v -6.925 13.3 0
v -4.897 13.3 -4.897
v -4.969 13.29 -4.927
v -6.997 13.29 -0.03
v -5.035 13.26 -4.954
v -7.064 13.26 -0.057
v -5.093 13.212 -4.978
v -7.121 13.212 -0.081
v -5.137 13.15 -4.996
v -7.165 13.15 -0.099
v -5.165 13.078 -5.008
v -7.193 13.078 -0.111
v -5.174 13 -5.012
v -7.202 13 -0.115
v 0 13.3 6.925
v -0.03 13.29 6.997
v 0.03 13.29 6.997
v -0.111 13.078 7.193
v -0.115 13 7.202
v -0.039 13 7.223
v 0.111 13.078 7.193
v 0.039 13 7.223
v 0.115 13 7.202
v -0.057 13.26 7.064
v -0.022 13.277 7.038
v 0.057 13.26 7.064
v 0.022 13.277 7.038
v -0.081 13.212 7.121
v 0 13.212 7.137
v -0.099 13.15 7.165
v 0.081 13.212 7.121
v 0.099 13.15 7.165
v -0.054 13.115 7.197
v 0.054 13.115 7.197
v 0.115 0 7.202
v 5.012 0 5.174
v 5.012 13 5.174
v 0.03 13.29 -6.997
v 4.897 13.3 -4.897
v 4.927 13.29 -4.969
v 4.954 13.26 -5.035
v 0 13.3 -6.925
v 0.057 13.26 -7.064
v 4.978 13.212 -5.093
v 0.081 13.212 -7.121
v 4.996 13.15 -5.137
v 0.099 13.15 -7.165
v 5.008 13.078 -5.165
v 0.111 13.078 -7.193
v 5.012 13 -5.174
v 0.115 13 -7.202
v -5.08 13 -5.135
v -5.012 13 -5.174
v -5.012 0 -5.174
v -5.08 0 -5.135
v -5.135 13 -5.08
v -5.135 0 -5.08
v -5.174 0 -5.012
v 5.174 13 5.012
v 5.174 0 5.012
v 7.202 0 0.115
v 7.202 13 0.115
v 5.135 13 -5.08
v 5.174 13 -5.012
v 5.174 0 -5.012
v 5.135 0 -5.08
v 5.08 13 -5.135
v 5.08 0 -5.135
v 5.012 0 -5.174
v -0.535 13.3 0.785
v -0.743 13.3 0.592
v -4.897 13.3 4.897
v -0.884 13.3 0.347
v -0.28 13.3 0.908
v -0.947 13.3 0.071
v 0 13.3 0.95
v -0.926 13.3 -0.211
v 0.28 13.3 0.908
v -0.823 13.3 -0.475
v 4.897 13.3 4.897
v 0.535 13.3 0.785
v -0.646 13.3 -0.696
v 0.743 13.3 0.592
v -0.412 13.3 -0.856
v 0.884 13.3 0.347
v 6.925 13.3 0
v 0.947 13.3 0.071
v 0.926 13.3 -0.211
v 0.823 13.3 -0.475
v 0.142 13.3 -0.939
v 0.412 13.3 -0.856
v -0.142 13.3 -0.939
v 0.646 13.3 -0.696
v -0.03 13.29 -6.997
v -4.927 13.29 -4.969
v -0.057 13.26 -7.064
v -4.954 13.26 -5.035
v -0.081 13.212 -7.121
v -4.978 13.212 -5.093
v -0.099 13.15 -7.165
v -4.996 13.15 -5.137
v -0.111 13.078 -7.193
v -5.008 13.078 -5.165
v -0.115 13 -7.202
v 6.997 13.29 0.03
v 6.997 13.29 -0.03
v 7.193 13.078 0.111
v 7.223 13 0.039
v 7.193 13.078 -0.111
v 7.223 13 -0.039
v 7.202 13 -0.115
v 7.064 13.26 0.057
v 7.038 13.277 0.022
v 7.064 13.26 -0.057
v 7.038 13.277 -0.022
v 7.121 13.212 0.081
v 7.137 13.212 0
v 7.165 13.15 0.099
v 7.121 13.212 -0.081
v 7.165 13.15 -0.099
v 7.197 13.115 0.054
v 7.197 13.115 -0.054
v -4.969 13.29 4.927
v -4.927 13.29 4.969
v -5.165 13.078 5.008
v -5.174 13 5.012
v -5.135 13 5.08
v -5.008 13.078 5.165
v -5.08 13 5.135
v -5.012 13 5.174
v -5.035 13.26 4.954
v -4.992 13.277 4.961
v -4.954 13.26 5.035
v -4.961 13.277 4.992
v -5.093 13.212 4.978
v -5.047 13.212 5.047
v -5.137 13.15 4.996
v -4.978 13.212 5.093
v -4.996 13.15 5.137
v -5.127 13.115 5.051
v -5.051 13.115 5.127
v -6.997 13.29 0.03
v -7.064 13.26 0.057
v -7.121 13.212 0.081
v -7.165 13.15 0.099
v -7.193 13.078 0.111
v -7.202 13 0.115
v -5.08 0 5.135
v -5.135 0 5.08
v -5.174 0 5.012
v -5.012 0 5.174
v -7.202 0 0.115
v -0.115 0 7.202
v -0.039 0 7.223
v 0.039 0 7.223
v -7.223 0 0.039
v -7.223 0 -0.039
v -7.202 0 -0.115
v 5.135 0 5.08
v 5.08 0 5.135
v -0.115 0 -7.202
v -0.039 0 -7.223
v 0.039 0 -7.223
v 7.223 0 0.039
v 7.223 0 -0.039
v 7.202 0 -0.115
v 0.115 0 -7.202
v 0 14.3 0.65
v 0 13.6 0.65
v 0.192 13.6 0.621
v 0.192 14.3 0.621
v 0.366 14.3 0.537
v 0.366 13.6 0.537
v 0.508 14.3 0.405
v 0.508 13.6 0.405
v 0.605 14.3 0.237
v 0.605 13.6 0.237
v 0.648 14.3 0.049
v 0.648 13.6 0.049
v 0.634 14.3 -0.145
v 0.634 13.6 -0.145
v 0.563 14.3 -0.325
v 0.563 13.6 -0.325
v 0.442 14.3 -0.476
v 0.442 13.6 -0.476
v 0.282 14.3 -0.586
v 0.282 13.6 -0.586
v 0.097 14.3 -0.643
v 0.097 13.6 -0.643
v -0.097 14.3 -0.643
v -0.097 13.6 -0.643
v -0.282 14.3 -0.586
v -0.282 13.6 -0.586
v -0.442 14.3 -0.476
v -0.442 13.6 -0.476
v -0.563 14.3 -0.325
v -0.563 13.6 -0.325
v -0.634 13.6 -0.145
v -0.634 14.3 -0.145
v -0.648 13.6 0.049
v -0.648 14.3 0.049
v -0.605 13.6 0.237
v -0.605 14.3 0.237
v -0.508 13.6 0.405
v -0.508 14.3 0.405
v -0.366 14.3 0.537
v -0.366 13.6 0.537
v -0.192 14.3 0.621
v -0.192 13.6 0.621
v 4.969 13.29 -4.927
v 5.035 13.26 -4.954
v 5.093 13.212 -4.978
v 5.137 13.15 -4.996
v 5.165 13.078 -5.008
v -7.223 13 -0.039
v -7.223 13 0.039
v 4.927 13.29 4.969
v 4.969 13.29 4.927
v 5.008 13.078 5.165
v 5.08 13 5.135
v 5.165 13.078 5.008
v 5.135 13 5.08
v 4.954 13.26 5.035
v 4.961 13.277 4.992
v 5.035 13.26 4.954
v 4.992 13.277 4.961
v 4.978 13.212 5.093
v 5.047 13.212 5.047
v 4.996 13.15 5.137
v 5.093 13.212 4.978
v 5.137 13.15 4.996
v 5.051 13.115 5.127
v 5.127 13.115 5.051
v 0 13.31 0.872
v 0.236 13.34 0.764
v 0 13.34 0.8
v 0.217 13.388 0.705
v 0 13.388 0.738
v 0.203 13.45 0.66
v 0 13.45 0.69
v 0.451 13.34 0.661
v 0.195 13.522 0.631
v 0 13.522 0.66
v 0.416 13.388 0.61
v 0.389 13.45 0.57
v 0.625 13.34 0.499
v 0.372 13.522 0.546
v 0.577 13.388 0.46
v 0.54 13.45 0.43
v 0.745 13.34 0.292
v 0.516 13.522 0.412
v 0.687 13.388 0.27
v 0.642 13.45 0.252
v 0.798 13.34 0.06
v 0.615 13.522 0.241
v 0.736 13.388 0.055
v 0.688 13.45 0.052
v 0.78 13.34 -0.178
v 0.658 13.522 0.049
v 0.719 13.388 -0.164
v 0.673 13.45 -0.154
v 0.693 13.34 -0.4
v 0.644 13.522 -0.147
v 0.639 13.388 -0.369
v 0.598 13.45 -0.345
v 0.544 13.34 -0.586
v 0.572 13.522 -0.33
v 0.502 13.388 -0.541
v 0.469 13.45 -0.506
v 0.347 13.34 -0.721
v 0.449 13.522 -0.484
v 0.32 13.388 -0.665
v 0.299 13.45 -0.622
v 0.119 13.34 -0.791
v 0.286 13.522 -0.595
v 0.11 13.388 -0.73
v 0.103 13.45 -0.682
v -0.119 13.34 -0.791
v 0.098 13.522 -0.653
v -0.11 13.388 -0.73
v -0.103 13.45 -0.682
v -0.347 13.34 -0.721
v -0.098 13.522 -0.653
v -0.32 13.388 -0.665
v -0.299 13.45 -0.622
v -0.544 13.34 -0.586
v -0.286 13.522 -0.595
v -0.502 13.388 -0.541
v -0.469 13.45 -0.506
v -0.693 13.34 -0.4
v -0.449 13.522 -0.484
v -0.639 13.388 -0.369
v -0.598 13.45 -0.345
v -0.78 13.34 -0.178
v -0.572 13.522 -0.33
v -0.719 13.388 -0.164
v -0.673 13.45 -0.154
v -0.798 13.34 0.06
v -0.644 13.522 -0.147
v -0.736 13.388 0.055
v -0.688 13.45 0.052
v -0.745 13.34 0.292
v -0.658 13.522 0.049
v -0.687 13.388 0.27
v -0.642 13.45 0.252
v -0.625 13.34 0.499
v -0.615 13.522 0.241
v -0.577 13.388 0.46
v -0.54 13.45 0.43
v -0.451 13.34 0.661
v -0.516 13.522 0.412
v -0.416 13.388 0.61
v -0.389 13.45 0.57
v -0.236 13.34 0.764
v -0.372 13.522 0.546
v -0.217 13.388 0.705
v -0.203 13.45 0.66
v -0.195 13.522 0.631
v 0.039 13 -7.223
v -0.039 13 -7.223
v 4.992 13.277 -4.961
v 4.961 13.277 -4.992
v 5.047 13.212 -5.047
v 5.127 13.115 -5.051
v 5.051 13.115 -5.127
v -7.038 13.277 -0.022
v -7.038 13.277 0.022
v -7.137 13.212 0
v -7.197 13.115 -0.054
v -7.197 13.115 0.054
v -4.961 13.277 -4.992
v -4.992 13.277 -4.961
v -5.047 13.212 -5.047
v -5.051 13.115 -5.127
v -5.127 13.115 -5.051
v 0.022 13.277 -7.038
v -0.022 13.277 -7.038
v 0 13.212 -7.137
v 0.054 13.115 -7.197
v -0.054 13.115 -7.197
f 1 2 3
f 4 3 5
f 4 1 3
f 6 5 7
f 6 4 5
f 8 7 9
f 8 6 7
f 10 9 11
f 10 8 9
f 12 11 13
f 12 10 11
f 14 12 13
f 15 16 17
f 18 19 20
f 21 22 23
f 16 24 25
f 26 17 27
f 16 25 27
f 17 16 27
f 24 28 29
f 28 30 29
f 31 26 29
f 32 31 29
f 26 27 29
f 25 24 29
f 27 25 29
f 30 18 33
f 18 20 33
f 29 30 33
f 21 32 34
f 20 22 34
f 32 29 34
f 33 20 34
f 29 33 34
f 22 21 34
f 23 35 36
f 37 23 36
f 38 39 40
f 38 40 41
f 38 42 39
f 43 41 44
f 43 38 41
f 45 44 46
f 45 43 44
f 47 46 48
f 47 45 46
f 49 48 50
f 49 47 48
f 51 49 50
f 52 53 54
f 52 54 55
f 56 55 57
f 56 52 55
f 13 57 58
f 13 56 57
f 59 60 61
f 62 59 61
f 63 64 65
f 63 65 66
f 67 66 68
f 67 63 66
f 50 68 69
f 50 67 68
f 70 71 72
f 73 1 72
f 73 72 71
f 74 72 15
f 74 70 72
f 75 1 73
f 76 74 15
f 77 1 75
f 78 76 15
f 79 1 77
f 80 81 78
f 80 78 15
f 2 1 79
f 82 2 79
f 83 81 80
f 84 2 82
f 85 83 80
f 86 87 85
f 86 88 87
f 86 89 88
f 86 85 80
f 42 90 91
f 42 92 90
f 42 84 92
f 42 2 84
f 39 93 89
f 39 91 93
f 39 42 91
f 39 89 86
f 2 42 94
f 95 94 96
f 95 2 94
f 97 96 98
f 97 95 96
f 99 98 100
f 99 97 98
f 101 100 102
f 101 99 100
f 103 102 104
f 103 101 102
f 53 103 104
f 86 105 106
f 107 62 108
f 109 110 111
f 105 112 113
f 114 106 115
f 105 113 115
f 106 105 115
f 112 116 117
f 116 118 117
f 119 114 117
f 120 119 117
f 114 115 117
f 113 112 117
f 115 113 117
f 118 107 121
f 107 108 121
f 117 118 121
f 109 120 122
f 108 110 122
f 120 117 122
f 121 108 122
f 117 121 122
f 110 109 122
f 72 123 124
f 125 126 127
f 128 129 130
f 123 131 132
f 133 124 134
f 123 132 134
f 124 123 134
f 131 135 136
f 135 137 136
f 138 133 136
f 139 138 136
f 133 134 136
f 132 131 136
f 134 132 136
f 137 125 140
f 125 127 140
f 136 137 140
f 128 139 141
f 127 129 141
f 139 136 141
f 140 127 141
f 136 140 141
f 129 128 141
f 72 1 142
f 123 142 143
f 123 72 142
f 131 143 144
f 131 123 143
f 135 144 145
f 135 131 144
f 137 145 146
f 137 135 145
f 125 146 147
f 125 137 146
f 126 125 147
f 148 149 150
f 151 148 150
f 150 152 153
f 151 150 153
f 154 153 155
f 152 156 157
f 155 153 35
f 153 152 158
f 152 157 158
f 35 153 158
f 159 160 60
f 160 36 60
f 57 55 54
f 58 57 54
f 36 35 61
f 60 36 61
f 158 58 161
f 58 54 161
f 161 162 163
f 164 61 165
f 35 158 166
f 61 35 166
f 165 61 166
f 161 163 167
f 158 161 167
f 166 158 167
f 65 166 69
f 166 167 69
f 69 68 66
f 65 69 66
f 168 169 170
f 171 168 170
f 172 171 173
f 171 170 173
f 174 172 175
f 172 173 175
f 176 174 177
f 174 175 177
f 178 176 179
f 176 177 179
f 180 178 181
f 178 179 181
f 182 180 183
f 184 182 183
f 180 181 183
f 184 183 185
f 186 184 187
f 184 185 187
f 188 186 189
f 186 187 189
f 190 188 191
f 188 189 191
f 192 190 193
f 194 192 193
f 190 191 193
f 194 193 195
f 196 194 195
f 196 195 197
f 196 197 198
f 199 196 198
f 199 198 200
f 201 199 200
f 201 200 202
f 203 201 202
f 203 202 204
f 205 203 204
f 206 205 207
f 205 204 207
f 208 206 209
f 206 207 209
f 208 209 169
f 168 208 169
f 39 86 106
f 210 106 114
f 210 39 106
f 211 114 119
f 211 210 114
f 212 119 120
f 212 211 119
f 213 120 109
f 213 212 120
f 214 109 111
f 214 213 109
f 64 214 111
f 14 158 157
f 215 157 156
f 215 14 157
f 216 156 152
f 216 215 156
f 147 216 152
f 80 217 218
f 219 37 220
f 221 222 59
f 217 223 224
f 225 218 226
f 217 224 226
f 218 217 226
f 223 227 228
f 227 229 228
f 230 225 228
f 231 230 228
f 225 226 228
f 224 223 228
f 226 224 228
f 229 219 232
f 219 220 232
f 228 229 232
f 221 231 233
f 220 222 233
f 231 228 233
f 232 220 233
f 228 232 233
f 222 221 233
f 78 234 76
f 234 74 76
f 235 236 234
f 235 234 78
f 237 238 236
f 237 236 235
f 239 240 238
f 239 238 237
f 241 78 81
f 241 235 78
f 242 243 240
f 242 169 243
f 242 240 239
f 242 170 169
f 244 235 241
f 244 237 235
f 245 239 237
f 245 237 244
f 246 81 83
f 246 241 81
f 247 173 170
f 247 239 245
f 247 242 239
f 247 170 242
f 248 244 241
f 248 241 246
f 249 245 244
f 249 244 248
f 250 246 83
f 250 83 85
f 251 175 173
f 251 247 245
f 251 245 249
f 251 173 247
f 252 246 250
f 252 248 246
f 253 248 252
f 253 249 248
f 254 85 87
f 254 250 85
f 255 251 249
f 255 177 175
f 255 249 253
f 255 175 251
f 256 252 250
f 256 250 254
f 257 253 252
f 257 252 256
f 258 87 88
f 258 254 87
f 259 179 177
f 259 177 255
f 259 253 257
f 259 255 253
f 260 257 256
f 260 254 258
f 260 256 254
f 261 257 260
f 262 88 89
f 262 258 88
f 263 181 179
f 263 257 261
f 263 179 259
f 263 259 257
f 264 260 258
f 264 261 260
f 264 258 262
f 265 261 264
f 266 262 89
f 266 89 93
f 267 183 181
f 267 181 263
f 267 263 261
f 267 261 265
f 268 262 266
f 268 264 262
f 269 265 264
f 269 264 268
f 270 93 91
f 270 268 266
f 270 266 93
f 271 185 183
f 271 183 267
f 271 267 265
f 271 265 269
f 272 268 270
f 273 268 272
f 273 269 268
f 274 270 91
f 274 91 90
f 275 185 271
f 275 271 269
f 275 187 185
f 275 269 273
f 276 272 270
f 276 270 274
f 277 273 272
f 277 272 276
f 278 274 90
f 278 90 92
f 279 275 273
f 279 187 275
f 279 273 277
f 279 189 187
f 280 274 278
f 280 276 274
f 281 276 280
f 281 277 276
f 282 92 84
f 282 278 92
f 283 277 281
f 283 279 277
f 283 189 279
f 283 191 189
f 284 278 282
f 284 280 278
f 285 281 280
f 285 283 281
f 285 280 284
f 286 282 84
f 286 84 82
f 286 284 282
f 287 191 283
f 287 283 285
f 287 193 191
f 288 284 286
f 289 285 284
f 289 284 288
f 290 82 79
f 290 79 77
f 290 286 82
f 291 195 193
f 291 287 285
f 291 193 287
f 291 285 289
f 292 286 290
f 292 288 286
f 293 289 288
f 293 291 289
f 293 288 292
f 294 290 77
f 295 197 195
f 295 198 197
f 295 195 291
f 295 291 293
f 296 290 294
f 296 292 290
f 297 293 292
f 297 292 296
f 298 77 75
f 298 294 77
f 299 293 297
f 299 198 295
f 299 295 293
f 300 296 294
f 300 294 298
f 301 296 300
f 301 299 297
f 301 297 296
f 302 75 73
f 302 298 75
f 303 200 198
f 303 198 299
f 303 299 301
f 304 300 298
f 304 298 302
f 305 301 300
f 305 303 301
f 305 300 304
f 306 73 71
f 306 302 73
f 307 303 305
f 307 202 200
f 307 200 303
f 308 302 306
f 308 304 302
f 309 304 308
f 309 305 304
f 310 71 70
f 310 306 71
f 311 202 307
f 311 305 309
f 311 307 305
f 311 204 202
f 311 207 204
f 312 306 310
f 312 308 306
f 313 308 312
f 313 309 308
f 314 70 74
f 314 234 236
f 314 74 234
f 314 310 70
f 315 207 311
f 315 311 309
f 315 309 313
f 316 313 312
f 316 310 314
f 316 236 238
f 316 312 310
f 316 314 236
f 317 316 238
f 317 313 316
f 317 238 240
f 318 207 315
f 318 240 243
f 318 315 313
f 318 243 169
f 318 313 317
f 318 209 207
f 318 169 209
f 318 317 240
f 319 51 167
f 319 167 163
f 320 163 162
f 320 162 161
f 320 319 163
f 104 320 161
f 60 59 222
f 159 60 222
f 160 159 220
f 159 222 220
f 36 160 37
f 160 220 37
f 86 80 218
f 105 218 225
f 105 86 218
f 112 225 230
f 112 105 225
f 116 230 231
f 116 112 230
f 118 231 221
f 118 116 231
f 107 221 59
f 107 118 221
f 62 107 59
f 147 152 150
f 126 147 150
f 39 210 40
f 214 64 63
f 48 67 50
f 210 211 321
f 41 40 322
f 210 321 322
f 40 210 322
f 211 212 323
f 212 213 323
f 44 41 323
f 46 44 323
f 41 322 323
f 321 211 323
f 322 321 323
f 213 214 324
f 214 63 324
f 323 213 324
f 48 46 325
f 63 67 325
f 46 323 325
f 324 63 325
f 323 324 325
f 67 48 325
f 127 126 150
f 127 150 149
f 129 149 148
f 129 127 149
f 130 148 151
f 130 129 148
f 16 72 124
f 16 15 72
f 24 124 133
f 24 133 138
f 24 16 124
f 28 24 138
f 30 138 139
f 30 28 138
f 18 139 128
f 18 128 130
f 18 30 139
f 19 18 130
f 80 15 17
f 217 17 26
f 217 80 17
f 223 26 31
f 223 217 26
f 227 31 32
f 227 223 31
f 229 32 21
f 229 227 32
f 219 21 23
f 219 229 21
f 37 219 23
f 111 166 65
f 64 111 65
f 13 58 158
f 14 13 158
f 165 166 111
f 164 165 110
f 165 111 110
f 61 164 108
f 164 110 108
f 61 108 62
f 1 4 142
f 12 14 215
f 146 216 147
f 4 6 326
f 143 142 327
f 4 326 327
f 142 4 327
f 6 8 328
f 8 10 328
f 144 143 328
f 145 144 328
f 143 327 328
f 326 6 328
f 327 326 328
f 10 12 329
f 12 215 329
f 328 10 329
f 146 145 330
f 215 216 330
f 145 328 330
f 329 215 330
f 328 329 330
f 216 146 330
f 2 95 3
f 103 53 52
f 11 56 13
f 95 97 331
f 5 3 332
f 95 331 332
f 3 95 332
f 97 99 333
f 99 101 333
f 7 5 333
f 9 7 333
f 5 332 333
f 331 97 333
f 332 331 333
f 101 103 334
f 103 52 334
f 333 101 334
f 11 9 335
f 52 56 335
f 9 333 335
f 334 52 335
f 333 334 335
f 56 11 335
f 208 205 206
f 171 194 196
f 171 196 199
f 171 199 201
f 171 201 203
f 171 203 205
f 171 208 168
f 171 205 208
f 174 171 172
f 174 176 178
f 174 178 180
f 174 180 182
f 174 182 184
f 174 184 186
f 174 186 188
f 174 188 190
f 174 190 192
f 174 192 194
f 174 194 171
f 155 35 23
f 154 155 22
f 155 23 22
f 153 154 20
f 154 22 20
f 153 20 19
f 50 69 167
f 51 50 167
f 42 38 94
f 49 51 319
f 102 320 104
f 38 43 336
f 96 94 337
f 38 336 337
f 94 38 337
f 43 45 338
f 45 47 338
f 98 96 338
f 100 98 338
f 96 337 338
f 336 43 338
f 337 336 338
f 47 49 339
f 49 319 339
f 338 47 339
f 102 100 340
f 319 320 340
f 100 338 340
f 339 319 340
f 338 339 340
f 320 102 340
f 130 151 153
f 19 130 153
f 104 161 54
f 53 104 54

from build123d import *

# Parameters (mm, degrees)
BOSS_EXTRUDE1_DEPTH = 13.3
SKETCH2_R           = 0.65
BOSS_EXTRUDE2_DEPTH = 1
FILLET1_R           = 0.3
FILLET2_R           = 0.3


with BuildPart() as part:
    # Sketch1 → Boss-Extrude1 (new body)
    with BuildSketch(Plane(origin=(0, 0, 0), x_dir=(1, 0, 0), z_dir=(0, 1, 0))):
        Polygon((7.25, 0), (5.126524164, 5.126524164), (0, 7.25), (-5.126524164, 5.126524164), (-7.25, 0), (-5.126524164, -5.126524164), (0, -7.25), (5.126524164, -5.126524164), align=None)
    extrude(amount=BOSS_EXTRUDE1_DEPTH)

    # Sketch2 → Boss-Extrude2 (add)
    with BuildSketch(Plane(origin=(0, 13.3, 0), x_dir=(1, 0, 0), z_dir=(0, 1, 0))):
        with Locations(Location((0, 0, 0), (0, 0, 270))):  # turned: the seam where the file's is
            Circle(SKETCH2_R)
    extrude(amount=BOSS_EXTRUDE2_DEPTH)

    # Fillet1
    fillet1_edges = [part.edges().sort_by_distance(p)[0] for p in [
        (5.126524164, 6.65, 5.126524164),
        (0, 6.65, 7.25),
        (-5.126524164, 6.65, 5.126524164),
        (-7.25, 6.65, 0),
        (-5.126524164, 6.65, -5.126524164),
        (0, 6.65, -7.25),
        (5.126524164, 6.65, -5.126524164),
        (7.25, 6.65, 0),
    ]]
    fillet(fillet1_edges, radius=FILLET1_R)

    # Fillet2
    fillet2_edges = [part.edges().sort_by_distance(p)[0] for p in [
        (0, 13.3, -0.65),
        (-2.563262082, 13.3, 6.188262082),
        (-6.188262082, 13.3, 2.563262082),
        (6.188262082, 13.3, 2.563262082),
        (6.188262082, 13.3, -2.563262082),
        (2.563262082, 13.3, -6.188262082),
        (-2.563262082, 13.3, -6.188262082),
        (-6.188262082, 13.3, -2.563262082),
        (2.563262082, 13.3, 6.188262082),
        (0, 13.3, 7.22528234),
        (5.109046139, 13.3, 5.109046139),
        (7.22528234, 13.3, 0),
        (5.109046139, 13.3, -5.109046139),
        (0, 13.3, -7.22528234),
        (-5.109046139, 13.3, -5.109046139),
        (-7.22528234, 13.3, 0),
        (-5.109046139, 13.3, 5.109046139),
    ]]
    fillet(fillet2_edges, radius=FILLET2_R)


solid = part.part
